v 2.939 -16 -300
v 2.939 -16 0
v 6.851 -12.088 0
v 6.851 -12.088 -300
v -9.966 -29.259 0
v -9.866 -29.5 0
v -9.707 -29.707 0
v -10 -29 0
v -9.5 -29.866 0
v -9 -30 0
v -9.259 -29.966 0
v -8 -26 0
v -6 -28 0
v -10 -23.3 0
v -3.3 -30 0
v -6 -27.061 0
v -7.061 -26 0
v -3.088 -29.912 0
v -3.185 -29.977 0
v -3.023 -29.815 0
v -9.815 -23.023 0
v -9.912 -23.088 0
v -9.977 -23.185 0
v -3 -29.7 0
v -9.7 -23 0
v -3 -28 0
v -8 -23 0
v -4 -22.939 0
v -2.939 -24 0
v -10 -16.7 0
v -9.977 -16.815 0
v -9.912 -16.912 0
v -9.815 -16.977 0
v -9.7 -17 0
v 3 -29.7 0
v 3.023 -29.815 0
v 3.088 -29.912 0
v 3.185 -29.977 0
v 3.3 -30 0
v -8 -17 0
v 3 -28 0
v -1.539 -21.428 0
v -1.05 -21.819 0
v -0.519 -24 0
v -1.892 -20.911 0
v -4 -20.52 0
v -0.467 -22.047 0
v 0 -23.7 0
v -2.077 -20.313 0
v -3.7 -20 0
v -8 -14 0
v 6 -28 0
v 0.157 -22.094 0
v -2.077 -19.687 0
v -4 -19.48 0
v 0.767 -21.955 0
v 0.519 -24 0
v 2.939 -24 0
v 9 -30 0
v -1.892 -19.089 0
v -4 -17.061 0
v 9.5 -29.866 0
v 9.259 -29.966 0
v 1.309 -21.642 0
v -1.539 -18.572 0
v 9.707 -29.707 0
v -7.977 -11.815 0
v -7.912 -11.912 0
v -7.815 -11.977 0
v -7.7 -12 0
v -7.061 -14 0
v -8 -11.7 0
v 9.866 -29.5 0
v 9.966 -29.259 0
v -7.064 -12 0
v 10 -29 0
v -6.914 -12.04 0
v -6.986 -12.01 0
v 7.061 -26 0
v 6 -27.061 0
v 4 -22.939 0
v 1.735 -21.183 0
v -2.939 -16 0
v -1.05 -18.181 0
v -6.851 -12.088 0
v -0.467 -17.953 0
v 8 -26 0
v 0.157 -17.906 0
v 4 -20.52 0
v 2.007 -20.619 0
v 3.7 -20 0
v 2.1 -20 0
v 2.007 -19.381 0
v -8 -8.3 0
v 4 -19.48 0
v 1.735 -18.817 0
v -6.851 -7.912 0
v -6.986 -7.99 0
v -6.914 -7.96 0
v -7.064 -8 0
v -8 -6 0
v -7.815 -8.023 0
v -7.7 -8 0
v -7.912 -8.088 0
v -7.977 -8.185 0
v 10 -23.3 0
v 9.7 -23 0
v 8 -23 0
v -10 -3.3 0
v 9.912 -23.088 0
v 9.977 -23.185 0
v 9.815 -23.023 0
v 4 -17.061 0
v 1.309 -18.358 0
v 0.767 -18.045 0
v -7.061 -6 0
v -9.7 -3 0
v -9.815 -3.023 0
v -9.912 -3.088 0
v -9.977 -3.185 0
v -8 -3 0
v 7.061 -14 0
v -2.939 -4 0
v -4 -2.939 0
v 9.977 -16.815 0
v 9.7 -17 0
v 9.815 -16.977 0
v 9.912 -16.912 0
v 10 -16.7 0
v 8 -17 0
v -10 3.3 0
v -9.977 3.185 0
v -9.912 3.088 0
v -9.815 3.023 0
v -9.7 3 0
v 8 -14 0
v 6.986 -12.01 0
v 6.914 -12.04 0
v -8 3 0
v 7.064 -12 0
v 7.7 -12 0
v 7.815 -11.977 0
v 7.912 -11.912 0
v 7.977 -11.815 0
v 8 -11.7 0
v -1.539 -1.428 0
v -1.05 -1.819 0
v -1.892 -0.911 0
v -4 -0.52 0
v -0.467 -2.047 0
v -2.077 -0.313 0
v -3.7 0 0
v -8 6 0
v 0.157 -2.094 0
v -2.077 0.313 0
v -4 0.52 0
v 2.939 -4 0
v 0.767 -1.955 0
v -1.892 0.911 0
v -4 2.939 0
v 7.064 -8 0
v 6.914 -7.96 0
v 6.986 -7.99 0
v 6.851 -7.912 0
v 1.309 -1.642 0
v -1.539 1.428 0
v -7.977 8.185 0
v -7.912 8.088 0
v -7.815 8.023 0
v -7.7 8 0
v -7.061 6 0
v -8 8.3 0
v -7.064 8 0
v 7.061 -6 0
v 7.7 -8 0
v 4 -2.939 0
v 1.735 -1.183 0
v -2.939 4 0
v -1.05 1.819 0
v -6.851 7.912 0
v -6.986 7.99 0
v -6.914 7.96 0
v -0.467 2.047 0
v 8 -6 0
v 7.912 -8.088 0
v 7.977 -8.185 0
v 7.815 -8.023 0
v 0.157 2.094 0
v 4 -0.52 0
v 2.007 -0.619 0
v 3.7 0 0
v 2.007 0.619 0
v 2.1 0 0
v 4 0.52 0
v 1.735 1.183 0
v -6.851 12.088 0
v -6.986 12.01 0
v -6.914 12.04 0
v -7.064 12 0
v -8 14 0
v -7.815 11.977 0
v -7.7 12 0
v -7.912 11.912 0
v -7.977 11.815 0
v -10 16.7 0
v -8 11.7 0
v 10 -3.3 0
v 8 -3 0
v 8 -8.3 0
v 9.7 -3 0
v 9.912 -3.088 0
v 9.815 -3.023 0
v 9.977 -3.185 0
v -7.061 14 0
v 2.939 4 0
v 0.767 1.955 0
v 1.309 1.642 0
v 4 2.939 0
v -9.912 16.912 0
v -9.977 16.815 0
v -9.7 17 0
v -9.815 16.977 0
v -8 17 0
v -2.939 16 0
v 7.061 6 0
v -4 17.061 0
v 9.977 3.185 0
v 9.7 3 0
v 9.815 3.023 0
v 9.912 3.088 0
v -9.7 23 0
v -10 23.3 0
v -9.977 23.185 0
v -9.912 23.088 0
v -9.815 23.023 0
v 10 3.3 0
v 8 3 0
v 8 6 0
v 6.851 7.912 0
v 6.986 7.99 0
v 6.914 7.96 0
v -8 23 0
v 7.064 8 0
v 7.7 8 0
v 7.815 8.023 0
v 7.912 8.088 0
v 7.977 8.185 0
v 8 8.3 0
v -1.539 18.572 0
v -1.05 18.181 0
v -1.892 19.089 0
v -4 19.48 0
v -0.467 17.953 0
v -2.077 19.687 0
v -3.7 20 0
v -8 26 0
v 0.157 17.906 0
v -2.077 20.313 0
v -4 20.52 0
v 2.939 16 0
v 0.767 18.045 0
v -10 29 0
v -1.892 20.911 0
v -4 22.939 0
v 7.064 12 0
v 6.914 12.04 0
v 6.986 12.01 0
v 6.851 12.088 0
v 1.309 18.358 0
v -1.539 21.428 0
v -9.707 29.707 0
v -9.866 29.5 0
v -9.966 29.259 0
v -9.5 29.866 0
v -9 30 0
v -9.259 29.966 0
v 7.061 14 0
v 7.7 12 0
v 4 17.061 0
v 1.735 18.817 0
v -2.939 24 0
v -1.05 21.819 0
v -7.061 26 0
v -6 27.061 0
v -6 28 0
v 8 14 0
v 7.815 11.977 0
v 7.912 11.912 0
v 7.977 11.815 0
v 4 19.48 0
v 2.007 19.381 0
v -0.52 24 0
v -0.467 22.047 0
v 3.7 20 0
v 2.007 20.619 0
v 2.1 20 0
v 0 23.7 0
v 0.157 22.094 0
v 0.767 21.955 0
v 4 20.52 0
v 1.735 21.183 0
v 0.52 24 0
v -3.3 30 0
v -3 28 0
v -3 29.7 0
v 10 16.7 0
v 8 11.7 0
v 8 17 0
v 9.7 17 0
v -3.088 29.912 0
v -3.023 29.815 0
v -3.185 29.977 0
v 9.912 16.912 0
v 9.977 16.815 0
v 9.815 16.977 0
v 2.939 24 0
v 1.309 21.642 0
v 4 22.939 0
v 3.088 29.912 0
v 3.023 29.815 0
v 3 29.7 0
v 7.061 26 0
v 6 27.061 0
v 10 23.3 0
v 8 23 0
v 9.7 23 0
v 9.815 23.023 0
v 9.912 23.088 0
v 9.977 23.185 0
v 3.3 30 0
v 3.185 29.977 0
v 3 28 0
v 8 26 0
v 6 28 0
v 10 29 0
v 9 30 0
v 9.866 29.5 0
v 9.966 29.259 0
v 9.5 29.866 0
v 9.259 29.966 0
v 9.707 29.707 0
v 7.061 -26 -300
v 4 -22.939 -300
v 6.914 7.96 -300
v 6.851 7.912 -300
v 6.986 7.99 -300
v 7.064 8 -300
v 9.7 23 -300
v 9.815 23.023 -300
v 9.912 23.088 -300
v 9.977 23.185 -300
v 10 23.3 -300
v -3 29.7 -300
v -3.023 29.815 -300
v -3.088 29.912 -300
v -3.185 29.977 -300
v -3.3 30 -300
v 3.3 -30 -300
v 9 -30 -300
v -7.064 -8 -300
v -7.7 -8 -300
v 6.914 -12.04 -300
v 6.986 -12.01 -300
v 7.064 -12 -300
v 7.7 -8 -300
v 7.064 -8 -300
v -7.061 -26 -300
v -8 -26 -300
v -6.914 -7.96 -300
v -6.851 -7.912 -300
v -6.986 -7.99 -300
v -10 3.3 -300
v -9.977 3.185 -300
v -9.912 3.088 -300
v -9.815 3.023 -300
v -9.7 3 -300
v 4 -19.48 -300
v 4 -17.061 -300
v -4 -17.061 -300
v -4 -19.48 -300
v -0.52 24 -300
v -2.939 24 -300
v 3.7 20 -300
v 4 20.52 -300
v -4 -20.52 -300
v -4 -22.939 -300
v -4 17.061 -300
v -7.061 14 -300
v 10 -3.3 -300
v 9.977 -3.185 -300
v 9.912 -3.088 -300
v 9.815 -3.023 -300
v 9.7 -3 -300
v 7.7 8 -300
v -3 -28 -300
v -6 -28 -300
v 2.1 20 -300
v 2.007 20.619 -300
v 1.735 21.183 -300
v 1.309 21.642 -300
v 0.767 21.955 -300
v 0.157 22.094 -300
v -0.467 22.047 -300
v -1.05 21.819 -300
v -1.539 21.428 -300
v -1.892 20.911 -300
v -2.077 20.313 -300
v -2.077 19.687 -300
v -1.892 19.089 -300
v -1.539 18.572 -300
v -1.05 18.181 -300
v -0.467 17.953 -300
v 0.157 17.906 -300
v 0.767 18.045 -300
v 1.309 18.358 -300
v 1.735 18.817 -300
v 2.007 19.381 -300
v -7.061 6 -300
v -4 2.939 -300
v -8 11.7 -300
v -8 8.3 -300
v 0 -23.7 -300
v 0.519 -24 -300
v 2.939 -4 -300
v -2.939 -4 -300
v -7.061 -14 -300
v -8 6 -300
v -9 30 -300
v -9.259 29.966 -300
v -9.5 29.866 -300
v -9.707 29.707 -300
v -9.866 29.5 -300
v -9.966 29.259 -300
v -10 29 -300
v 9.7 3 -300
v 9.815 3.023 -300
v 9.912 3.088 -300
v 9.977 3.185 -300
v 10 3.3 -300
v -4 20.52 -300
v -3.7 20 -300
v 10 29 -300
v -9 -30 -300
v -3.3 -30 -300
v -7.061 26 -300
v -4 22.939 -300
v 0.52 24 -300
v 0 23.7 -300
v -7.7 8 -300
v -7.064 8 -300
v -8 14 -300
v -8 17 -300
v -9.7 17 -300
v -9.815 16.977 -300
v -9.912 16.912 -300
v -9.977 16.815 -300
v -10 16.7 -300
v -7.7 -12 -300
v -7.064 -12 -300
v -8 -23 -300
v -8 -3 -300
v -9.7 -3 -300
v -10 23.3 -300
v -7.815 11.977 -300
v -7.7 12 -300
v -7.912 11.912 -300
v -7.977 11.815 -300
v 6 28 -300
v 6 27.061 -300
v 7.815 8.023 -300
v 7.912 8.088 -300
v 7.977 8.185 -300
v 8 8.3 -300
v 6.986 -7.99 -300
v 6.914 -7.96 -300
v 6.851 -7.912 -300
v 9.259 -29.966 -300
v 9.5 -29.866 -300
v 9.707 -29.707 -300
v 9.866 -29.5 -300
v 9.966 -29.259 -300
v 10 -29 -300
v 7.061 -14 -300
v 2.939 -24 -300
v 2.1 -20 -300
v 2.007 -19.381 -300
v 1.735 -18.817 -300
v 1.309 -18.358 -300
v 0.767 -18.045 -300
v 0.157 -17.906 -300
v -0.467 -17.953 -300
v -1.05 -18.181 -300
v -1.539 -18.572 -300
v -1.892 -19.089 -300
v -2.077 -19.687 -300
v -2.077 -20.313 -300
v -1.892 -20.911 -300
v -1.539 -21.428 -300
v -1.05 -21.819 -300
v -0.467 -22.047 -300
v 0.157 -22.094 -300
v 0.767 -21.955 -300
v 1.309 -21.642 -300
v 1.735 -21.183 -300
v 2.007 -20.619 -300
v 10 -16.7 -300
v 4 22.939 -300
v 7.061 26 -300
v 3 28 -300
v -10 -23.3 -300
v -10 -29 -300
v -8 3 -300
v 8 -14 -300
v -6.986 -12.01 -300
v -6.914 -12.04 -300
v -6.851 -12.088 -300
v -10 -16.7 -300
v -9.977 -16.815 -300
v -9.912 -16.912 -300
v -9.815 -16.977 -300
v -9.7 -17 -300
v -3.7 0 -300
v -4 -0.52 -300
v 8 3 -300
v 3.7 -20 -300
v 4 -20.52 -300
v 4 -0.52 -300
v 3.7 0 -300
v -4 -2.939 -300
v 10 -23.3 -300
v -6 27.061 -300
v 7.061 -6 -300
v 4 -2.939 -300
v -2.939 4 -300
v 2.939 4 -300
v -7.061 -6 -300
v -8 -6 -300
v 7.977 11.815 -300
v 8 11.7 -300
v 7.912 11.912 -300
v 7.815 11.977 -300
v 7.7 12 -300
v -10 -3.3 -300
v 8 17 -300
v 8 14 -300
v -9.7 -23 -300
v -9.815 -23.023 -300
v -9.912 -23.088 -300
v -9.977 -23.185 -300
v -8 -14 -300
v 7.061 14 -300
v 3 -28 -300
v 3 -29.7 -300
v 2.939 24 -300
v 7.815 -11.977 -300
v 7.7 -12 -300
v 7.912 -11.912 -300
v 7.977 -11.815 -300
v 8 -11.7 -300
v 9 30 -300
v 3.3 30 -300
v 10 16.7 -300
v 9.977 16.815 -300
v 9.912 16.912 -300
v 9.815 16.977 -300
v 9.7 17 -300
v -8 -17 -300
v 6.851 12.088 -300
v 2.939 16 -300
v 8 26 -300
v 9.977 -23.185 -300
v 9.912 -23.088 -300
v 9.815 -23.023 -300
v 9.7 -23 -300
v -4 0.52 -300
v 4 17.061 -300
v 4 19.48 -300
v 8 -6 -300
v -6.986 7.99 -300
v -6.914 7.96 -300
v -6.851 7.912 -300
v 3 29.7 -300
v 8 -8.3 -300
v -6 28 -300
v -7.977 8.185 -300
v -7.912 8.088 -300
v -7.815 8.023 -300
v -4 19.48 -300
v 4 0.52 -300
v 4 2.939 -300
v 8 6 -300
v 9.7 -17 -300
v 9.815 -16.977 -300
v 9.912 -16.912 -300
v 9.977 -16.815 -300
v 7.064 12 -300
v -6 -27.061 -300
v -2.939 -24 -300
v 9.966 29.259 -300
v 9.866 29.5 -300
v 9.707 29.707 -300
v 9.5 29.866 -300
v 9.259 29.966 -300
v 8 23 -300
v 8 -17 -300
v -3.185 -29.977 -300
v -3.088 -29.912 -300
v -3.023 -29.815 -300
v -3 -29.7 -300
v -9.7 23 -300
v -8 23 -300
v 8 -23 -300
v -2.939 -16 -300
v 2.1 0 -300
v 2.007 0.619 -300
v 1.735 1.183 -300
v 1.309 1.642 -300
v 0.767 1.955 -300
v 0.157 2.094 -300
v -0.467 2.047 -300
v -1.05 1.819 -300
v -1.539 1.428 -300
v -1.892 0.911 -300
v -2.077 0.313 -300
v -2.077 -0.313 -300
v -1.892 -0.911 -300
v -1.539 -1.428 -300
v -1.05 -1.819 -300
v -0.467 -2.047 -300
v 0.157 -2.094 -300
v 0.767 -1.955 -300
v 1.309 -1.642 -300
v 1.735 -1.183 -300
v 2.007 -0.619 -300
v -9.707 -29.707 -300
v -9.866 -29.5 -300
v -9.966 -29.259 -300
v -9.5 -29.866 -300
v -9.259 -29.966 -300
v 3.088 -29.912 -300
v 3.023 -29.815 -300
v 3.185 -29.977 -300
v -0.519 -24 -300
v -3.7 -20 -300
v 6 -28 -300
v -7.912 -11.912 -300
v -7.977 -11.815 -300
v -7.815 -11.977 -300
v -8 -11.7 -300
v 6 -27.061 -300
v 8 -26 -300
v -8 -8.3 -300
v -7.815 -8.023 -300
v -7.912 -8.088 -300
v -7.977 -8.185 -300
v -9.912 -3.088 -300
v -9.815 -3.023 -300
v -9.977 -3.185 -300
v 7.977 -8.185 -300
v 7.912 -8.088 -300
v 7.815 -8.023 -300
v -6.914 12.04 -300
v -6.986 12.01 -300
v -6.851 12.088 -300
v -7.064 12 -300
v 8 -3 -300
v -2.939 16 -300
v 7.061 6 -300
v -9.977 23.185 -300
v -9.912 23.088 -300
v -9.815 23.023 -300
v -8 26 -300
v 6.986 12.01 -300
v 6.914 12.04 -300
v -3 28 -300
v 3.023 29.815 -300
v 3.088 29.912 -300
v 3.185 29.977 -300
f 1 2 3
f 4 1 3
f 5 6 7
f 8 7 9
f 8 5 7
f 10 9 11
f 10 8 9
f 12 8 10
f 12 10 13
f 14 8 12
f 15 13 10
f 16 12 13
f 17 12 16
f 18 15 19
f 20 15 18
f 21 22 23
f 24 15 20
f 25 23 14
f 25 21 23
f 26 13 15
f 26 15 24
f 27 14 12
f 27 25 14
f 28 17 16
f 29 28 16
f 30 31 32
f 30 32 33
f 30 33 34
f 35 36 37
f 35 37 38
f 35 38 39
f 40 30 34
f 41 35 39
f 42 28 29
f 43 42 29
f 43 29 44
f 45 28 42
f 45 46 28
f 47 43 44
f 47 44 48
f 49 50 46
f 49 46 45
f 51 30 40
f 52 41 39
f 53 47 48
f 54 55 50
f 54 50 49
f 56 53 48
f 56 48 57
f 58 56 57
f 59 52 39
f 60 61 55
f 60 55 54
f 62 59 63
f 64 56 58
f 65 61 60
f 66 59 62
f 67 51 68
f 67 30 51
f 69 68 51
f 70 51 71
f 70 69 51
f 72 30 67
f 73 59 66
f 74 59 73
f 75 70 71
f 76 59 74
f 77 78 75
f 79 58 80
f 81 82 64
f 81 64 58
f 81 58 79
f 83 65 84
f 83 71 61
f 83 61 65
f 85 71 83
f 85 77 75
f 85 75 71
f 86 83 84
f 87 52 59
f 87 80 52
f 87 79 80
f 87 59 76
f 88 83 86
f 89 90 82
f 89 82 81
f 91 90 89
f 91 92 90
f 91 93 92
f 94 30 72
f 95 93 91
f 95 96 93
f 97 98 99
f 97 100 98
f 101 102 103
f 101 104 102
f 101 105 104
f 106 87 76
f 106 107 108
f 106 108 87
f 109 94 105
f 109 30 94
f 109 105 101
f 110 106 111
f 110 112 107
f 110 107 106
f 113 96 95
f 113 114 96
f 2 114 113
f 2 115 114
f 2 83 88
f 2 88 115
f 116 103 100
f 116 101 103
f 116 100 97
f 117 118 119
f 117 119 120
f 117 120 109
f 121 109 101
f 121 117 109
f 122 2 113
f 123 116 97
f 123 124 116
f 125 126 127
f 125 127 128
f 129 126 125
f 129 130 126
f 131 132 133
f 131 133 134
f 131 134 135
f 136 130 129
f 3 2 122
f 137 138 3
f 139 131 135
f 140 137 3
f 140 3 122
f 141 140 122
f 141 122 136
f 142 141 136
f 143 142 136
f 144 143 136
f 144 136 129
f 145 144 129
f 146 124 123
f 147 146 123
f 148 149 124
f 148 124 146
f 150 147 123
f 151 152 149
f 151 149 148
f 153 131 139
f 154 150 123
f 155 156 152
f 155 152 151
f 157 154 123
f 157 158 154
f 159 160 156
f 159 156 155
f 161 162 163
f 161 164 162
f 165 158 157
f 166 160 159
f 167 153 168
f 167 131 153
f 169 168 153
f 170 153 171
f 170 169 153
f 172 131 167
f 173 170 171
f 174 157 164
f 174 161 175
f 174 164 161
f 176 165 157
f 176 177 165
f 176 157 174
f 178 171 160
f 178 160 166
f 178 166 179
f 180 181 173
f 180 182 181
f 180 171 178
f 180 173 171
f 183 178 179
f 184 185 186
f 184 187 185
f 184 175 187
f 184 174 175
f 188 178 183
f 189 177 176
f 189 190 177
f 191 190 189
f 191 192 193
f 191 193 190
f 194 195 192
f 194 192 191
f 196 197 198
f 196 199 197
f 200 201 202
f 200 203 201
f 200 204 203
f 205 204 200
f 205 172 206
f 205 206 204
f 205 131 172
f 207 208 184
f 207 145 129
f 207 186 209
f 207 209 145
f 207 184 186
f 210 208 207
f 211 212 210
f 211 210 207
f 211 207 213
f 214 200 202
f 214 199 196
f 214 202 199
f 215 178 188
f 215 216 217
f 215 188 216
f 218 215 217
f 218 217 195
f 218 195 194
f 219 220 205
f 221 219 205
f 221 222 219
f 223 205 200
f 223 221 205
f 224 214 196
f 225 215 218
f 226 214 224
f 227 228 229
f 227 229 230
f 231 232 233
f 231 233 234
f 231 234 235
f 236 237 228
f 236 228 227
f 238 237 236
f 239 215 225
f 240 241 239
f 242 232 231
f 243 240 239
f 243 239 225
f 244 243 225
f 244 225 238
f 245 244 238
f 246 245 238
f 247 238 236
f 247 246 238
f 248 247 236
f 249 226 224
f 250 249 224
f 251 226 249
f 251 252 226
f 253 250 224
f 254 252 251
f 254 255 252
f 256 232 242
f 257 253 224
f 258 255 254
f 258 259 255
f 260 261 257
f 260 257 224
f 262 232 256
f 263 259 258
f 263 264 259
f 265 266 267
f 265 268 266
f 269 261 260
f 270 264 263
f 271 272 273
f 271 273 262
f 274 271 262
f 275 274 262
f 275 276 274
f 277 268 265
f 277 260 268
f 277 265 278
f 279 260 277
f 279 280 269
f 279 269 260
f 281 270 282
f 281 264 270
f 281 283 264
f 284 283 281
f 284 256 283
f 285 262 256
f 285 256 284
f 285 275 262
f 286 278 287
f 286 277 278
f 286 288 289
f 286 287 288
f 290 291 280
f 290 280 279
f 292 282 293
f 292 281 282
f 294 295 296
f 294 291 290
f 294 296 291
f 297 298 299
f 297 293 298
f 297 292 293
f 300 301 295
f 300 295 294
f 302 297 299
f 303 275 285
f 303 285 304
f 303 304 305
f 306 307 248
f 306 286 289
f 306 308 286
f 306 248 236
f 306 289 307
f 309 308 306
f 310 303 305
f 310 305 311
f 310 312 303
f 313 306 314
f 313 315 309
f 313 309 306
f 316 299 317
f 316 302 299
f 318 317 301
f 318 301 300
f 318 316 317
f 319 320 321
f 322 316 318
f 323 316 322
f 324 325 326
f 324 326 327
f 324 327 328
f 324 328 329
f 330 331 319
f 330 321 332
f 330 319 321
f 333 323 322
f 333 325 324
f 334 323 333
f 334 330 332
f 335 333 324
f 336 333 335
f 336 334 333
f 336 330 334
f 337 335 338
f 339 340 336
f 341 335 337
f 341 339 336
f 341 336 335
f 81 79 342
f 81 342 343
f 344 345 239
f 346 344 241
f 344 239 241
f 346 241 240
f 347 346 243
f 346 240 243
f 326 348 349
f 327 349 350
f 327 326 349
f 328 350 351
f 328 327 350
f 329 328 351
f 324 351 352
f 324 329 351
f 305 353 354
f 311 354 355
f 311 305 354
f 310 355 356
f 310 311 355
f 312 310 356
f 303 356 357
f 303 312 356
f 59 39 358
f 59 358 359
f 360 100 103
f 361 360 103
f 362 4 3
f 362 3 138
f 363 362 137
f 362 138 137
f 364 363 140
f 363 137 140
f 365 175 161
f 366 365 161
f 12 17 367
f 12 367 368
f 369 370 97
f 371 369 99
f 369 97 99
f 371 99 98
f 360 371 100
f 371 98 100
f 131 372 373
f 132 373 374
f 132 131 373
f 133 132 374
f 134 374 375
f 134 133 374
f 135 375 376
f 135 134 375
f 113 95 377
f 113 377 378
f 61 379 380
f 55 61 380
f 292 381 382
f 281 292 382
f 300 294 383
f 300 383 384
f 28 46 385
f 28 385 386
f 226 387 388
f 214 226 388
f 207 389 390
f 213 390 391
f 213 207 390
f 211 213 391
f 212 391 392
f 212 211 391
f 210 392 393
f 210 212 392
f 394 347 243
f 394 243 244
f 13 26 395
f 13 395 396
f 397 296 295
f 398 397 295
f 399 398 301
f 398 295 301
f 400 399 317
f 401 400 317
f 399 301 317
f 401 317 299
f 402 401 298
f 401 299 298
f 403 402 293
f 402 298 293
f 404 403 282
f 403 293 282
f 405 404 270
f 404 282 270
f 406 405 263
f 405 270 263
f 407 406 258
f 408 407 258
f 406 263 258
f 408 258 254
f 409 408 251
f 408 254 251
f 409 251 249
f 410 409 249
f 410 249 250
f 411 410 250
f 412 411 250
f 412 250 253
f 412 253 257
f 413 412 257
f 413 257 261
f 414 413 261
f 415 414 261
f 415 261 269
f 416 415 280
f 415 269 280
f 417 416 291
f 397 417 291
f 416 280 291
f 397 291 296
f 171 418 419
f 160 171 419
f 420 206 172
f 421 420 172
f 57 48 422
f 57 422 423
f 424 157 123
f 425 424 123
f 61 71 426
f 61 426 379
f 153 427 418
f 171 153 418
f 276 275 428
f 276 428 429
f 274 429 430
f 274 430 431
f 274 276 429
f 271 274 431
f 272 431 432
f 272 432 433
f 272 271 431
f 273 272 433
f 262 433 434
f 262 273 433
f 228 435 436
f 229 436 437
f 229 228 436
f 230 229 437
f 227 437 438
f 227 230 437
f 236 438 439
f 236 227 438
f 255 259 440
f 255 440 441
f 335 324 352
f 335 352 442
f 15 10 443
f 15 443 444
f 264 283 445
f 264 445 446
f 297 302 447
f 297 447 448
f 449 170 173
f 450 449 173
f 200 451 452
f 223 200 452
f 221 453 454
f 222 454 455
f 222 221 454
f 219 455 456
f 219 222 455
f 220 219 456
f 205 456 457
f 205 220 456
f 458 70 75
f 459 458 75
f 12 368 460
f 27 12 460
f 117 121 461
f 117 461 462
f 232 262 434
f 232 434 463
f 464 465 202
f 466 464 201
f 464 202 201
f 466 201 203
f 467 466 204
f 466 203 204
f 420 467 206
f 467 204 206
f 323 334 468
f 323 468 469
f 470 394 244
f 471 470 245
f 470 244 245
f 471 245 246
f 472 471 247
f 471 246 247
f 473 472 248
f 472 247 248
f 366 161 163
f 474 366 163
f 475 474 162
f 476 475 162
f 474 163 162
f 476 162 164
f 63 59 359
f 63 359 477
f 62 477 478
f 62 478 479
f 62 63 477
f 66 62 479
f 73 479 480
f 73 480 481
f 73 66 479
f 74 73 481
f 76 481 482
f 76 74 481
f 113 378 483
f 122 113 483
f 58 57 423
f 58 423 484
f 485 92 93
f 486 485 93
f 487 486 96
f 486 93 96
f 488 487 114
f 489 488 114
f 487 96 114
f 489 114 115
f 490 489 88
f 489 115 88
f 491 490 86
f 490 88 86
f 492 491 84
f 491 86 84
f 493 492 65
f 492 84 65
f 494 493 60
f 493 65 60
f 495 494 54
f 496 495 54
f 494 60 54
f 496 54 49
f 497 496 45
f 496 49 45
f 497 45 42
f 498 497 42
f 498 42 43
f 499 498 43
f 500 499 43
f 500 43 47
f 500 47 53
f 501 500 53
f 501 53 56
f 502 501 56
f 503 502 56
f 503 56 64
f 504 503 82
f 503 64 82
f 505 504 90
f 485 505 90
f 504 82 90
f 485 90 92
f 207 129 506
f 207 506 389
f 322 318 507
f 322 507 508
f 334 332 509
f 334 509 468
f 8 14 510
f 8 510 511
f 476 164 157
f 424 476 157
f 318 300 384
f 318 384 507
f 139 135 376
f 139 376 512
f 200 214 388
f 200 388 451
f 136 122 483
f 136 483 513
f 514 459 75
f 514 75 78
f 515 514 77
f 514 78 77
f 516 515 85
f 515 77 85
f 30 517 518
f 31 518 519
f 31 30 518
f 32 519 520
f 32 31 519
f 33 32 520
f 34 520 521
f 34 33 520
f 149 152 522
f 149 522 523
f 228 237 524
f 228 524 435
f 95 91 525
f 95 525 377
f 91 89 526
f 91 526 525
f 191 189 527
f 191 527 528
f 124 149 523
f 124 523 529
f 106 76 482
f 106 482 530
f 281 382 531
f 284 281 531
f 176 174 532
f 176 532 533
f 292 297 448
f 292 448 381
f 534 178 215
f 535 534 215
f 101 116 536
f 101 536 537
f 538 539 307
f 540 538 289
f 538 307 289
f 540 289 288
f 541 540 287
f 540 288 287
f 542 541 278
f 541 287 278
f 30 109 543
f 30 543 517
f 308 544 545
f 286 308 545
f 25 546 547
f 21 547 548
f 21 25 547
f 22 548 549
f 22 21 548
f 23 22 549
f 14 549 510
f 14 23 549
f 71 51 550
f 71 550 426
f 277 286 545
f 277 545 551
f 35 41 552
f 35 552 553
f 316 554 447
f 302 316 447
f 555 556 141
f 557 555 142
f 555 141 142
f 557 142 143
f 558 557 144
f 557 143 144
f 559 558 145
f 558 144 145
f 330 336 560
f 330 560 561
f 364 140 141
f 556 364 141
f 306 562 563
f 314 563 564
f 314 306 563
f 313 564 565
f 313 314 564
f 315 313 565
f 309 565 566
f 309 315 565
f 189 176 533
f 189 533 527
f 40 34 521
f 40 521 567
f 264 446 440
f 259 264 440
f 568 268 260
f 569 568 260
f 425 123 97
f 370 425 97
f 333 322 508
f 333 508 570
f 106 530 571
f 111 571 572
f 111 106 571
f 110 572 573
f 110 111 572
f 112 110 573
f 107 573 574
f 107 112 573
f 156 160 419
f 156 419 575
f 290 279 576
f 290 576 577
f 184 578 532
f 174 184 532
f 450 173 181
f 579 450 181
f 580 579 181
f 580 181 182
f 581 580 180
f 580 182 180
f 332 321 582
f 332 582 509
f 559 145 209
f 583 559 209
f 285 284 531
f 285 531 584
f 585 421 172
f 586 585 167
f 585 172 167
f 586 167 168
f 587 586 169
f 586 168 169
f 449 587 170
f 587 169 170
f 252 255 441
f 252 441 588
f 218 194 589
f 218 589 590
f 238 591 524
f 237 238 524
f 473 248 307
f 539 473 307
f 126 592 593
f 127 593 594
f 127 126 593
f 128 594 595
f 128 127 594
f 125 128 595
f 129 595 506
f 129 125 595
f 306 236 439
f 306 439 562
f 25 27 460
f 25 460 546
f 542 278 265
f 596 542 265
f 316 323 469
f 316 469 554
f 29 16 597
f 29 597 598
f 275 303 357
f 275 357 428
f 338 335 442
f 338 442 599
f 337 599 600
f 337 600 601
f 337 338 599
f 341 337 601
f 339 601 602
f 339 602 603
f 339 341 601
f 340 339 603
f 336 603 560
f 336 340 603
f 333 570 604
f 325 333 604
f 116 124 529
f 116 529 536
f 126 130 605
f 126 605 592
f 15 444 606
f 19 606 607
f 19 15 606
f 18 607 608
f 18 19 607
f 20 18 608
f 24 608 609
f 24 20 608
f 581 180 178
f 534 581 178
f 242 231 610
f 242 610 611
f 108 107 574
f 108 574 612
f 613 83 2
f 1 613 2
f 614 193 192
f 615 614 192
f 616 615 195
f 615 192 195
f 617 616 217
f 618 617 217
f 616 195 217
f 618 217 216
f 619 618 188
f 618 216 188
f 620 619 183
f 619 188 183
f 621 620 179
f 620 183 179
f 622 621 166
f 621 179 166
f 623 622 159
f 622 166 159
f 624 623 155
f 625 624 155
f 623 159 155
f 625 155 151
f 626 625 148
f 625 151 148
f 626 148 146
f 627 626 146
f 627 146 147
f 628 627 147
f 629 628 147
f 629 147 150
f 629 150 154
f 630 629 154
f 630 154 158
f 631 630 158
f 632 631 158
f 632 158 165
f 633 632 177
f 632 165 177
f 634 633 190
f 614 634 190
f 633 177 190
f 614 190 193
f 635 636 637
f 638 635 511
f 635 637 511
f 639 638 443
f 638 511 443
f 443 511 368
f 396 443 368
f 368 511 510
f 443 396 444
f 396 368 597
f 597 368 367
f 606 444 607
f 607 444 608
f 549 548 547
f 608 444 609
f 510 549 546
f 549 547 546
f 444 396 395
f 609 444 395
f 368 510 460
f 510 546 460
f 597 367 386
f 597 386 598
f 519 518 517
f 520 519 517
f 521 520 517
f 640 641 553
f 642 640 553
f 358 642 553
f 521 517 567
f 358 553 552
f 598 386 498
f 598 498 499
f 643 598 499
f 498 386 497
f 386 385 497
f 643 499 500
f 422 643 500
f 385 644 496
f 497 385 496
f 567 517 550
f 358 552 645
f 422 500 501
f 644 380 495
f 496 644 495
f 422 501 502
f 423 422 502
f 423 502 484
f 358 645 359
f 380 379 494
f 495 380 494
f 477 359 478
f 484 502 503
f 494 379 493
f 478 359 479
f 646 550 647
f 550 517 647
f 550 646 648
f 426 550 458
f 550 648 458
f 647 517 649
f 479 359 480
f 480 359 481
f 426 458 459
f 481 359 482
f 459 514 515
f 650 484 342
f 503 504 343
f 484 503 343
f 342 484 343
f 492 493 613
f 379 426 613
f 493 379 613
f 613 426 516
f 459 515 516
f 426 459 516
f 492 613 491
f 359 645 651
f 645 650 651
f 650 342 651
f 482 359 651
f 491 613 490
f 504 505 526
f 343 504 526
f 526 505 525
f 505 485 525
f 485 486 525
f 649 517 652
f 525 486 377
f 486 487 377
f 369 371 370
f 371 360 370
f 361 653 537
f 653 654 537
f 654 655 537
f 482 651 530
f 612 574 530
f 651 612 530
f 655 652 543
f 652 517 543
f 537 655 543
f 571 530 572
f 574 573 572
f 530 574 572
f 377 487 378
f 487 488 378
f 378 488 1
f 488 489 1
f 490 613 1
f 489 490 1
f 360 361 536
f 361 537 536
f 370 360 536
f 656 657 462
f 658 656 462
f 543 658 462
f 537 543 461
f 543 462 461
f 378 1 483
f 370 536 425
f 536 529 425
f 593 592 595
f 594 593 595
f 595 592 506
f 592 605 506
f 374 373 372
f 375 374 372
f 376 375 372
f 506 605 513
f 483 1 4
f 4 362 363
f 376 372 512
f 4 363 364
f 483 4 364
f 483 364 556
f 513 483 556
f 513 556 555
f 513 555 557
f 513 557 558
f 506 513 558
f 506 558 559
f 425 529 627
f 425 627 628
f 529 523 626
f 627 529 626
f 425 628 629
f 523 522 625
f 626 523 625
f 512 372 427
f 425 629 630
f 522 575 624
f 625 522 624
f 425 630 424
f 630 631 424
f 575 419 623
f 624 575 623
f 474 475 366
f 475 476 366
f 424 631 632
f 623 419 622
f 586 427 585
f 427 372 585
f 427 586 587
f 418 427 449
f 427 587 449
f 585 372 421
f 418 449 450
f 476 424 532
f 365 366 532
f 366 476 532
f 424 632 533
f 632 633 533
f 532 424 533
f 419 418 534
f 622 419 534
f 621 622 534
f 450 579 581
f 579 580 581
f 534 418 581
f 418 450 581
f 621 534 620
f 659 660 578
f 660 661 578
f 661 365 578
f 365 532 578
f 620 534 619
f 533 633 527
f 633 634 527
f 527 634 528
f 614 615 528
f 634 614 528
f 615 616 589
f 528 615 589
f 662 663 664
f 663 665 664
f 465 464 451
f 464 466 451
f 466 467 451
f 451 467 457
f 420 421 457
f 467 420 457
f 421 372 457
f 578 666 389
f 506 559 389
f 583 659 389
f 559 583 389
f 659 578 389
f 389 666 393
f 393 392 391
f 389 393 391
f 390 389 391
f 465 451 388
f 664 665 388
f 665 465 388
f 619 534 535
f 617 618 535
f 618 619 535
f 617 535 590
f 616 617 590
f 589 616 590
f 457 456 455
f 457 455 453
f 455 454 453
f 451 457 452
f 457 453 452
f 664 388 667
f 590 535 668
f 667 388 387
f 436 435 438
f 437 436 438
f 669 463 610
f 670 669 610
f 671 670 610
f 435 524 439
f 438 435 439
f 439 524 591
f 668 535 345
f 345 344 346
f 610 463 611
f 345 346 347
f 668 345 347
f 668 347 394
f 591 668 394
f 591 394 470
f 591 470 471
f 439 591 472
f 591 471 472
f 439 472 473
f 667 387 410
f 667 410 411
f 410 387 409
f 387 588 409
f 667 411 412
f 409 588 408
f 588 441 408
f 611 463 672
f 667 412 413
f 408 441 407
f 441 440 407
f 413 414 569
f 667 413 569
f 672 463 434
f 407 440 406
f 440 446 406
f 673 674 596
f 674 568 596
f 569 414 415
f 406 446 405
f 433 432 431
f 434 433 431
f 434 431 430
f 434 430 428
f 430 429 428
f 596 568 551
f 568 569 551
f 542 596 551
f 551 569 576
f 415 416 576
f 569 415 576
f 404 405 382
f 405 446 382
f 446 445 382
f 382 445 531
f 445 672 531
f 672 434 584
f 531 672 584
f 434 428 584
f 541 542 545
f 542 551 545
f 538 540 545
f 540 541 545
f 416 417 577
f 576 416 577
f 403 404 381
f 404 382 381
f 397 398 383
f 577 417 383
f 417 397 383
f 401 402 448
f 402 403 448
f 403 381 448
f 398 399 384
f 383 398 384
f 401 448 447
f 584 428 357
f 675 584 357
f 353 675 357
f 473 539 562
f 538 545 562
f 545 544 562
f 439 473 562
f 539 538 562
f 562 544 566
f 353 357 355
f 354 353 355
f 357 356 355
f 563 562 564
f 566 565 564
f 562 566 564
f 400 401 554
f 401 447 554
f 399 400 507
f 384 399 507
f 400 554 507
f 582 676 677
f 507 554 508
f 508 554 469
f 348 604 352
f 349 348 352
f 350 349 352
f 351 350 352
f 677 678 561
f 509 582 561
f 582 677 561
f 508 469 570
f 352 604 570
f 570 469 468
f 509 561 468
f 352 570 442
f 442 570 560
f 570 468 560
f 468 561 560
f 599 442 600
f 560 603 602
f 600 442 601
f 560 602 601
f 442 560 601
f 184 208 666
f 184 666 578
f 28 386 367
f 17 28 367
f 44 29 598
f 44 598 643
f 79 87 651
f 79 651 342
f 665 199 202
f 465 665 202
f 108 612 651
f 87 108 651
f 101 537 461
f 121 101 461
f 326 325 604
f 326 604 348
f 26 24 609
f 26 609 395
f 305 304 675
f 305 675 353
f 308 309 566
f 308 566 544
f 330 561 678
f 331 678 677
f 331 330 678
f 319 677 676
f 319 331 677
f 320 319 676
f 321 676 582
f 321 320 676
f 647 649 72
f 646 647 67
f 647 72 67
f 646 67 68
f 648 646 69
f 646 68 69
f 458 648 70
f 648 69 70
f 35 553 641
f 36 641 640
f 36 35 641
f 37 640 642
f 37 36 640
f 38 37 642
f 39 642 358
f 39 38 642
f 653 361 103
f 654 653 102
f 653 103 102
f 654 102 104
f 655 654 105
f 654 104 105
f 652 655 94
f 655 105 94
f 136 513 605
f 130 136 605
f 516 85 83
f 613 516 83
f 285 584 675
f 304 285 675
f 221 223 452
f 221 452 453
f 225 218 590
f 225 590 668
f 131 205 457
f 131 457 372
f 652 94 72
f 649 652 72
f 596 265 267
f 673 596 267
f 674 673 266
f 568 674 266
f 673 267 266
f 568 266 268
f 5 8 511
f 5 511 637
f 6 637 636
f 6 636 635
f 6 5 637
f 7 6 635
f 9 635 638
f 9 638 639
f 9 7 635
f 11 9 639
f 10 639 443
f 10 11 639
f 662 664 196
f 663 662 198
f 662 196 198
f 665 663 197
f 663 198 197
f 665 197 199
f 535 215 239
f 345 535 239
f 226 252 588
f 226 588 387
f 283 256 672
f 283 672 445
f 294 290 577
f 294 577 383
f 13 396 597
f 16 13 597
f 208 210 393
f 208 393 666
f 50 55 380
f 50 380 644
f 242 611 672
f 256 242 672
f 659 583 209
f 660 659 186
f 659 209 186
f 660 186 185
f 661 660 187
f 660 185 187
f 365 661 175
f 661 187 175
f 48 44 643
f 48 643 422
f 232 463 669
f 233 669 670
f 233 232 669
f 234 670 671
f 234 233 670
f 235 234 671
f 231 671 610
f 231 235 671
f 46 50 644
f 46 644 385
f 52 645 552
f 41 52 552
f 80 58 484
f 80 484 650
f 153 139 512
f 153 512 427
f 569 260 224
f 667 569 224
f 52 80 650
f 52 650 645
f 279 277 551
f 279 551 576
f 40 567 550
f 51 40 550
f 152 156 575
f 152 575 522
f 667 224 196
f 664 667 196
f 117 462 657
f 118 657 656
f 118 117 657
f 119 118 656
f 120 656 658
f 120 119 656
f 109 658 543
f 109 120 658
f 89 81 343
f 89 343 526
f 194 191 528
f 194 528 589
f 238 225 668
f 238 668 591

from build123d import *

# Parameters (mm, degrees)
SKETCH1_R           = 2.0999999
BOSS_EXTRUDE1_DEPTH = 300


with BuildPart() as part:
    # Sketch1 → Boss-Extrude1 (new body)
    with BuildSketch(Plane.XY):
        with BuildLine():
            Line((-10, 16.7), (-10, 3.3))
            ThreePointArc((-10, 3.3), (-9.912132034, 3.087867966), (-9.7, 3))
            Line((-9.7, 3), (-8, 3))
            Line((-8, 3), (-8, 6))
            Line((-8, 6), (-7.060650687, 6))
            Line((-7.060650687, 6), (-4, 2.939349))
            Line((-4, 2.939349), (-4, 0.519615242))
            Line((-4, 0.519615242), (-3.7, 0))
            Line((-3.7, 0), (-4, -0.519615242))
            Line((-4, -0.519615242), (-4, -2.9393502))
            Line((-4, -2.9393502), (-7.060649487, -6))
            Line((-7.060649487, -6), (-8, -6))
            Line((-8, -6), (-8, -3))
            Line((-8, -3), (-9.7, -3))
            ThreePointArc((-9.7, -3), (-9.912132034, -3.087867966), (-10, -3.3))
            Line((-10, -3.3), (-10, -16.7))
            ThreePointArc((-10, -16.7), (-9.912132034, -16.912132034), (-9.7, -17))
            Line((-9.7, -17), (-8, -17))
            Line((-8, -17), (-8, -14))
            Line((-8, -14), (-7.060672887, -14))
            Line((-7.060672887, -14), (-4, -17.0606732))
            Line((-4, -17.0606732), (-4, -19.480384758))
            Line((-4, -19.480384758), (-3.7, -20))
            Line((-3.7, -20), (-4, -20.519615242))
            Line((-4, -20.519615242), (-4, -22.93935665))
            Line((-4, -22.93935665), (-7.060643037, -26))
            Line((-7.060643037, -26), (-8, -26))
            Line((-8, -26), (-8, -23))
            Line((-8, -23), (-9.7, -23))
            ThreePointArc((-9.7, -23), (-9.912132034, -23.087867966), (-10, -23.3))
            Line((-10, -23.3), (-10, -29))
            ThreePointArc((-10, -29), (-9.707106781, -29.707106781), (-9, -30))
            Line((-9, -30), (-3.3, -30))
            ThreePointArc((-3.3, -30), (-3.087867966, -29.912132034), (-3, -29.7))
            Line((-3, -29.7), (-3, -28))
            Line((-3, -28), (-6, -28))
            Line((-6, -28), (-6, -27.060683408))
            Line((-6, -27.060683408), (-2.939316, -24))
            Line((-2.939316, -24), (-0.519095055, -24))
            Line((-0.519095055, -24), (1e-06, -23.7))
            Line((1e-06, -23.7), (0.518577868, -24))
            Line((0.518577868, -24), (2.939318, -24))
            Line((2.939318, -24), (6, -27.060682403))
            Line((6, -27.060682403), (6, -28))
            Line((6, -28), (3, -28))
            Line((3, -28), (3, -29.7))
            ThreePointArc((3, -29.7), (3.087867966, -29.912132034), (3.3, -30))
            Line((3.3, -30), (9, -30))
            ThreePointArc((9, -30), (9.707106781, -29.707106781), (10, -29))
            Line((10, -29), (10, -23.3))
            ThreePointArc((10, -23.3), (9.912132034, -23.087867966), (9.7, -23))
            Line((9.7, -23), (8, -23))
            Line((8, -23), (8, -26))
            Line((8, -26), (7.060637687, -26))
            Line((7.060637687, -26), (4, -22.93935641))
            Line((4, -22.93935641), (4, -20.519623992))
            Line((4, -20.519623992), (3.7, -20.00000875))
            Line((3.7, -20.00000875), (4, -19.480393508))
            Line((4, -19.480393508), (4, -17.06066109))
            Line((4, -17.06066109), (7.060655187, -14))
            Line((7.060655187, -14), (8, -14))
            Line((8, -14), (8, -17))
            Line((8, -17), (9.7, -17))
            ThreePointArc((9.7, -17), (9.912132034, -16.912132034), (10, -16.7))
            Line((10, -16.7), (10, -3.3))
            ThreePointArc((10, -3.3), (9.912132034, -3.087867966), (9.7, -3))
            Line((9.7, -3), (8, -3))
            Line((8, -3), (8, -6))
            Line((8, -6), (7.060651537, -6))
            Line((7.060651537, -6), (4, -2.93934815))
            Line((4, -2.93934815), (4, -0.519623992))
            Line((4, -0.519623992), (3.7, -8.75e-06))
            Line((3.7, -8.75e-06), (4, 0.519606492))
            Line((4, 0.519606492), (4, 2.9393426))
            Line((4, 2.9393426), (7.060657087, 6))
            Line((7.060657087, 6), (8, 6))
            Line((8, 6), (8, 3))
            Line((8, 3), (9.7, 3))
            ThreePointArc((9.7, 3), (9.912132034, 3.087867966), (10, 3.3))
            Line((10, 3.3), (10, 16.7))
            ThreePointArc((10, 16.7), (9.912132034, 16.912132034), (9.7, 17))
            Line((9.7, 17), (8, 17))
            Line((8, 17), (8, 14))
            Line((8, 14), (7.06065821, 14))
            Line((7.06065821, 14), (4, 17.060658523))
            Line((4, 17.060658523), (4, 19.480376008))
            Line((4, 19.480376008), (3.7, 19.99999125))
            Line((3.7, 19.99999125), (4, 20.519606492))
            Line((4, 20.519606492), (4, 22.939362173))
            Line((4, 22.939362173), (7.060637514, 26))
            Line((7.060637514, 26), (8, 26))
            Line((8, 26), (8, 23))
            Line((8, 23), (9.7, 23))
            ThreePointArc((9.7, 23), (9.912132034, 23.087867966), (10, 23.3))
            Line((10, 23.3), (10, 29))
            ThreePointArc((10, 29), (9.707106781, 29.707106781), (9, 30))
            Line((9, 30), (3.3, 30))
            ThreePointArc((3.3, 30), (3.087867966, 29.912132034), (3, 29.7))
            Line((3, 29.7), (3, 28))
            Line((3, 28), (6, 28))
            Line((6, 28), (6, 27.060684313))
            Line((6, 27.060684313), (2.939316, 24))
            Line((2.939316, 24), (0.519614242, 24))
            Line((0.519614242, 24), (-1e-06, 23.7))
            Line((-1e-06, 23.7), (-0.519616242, 24))
            Line((-0.519616242, 24), (-2.939318, 24))
            Line((-2.939318, 24), (-6, 27.060682313))
            Line((-6, 27.060682313), (-6, 28))
            Line((-6, 28), (-3, 28))
            Line((-3, 28), (-3, 29.7))
            ThreePointArc((-3, 29.7), (-3.087867966, 29.912132034), (-3.3, 30))
            Line((-3.3, 30), (-9, 30))
            ThreePointArc((-9, 30), (-9.707106781, 29.707106781), (-10, 29))
            Line((-10, 29), (-10, 23.3))
            ThreePointArc((-10, 23.3), (-9.912132034, 23.087867966), (-9.7, 23))
            Line((-9.7, 23), (-8, 23))
            Line((-8, 23), (-8, 26))
            Line((-8, 26), (-7.060644014, 26))
            Line((-7.060644014, 26), (-4, 22.939355673))
            Line((-4, 22.939355673), (-4, 20.519615242))
            Line((-4, 20.519615242), (-3.7, 20))
            Line((-3.7, 20), (-4, 19.480384758))
            Line((-4, 19.480384758), (-4, 17.060669373))
            Line((-4, 17.060669373), (-7.06066906, 14))
            Line((-7.06066906, 14), (-8, 14))
            Line((-8, 14), (-8, 17))
            Line((-8, 17), (-9.7, 17))
            ThreePointArc((-9.7, 17), (-9.912132034, 16.912132034), (-10, 16.7))
        make_face()
        with Locations((0, 20.000013123)):
            Circle(SKETCH1_R, mode=Mode.SUBTRACT)
        Circle(SKETCH1_R, mode=Mode.SUBTRACT)
        with Locations((0, -20.000013525)):
            Circle(SKETCH1_R, mode=Mode.SUBTRACT)
        with BuildLine():
            Line((-7.7, 8), (-7.063594325, 8))
            ThreePointArc((-7.063594325, 8), (-6.948789288, 7.977163857), (-6.85146228, 7.912132024))
            Line((-6.85146228, 7.912132024), (-2.939330656, 4))
            Line((-2.939330656, 4), (2.939337056, 4))
            Line((2.939337056, 4), (6.85146868, 7.912132024))
            ThreePointArc((6.85146868, 7.912132024), (6.948795688, 7.977163857), (7.063600725, 8))
            Line((7.063600725, 8), (7.7, 8))
            ThreePointArc((7.7, 8), (7.912132034, 8.087867966), (8, 8.3))
            Line((8, 8.3), (8, 11.7))
            ThreePointArc((8, 11.7), (7.912132034, 11.912132034), (7.7, 12))
            Line((7.7, 12), (7.063601848, 12))
            ThreePointArc((7.063601848, 12), (6.948796811, 12.022836143), (6.851469803, 12.087867976))
            Line((6.851469803, 12.087867976), (2.939338179, 16))
            Line((2.939338179, 16), (-2.939349029, 16))
            Line((-2.939349029, 16), (-6.851480653, 12.087867976))
            ThreePointArc((-6.851480653, 12.087867976), (-6.948807661, 12.022836143), (-7.063612698, 12))
            Line((-7.063612698, 12), (-7.7, 12))
            ThreePointArc((-7.7, 12), (-7.912132034, 11.912132034), (-8, 11.7))
            Line((-8, 11.7), (-8, 8.3))
            ThreePointArc((-8, 8.3), (-7.912132034, 8.087867966), (-7.7, 8))
        make_face(mode=Mode.SUBTRACT)
        with BuildLine():
            Line((-8, -8.3), (-8, -11.7))
            ThreePointArc((-8, -11.7), (-7.912132034, -11.912132034), (-7.7, -12))
            Line((-7.7, -12), (-7.063616525, -12))
            ThreePointArc((-7.063616525, -12), (-6.948811488, -12.022836143), (-6.85148448, -12.087867976))
            Line((-6.85148448, -12.087867976), (-2.939352856, -16))
            Line((-2.939352856, -16), (2.939340746, -16))
            Line((2.939340746, -16), (6.851465031, -12.08786817))
            ThreePointArc((6.851465031, -12.08786817), (6.948792107, -12.022836196), (7.06359727, -12))
            Line((7.06359727, -12), (7.7, -12))
            ThreePointArc((7.7, -12), (7.912132034, -11.912132034), (8, -11.7))
            Line((8, -11.7), (8, -8.3))
            ThreePointArc((8, -8.3), (7.912132034, -8.087867966), (7.7, -8))
            Line((7.7, -8), (7.063595175, -8))
            ThreePointArc((7.063595175, -8), (6.948790138, -7.977163857), (6.85146313, -7.912132024))
            Line((6.85146313, -7.912132024), (2.939331506, -4))
            Line((2.939331506, -4), (-2.939329456, -4))
            Line((-2.939329456, -4), (-6.85146108, -7.912132024))
            ThreePointArc((-6.85146108, -7.912132024), (-6.948788088, -7.977163857), (-7.063593125, -8))
            Line((-7.063593125, -8), (-7.7, -8))
            ThreePointArc((-7.7, -8), (-7.912132034, -8.087867966), (-8, -8.3))
        make_face(mode=Mode.SUBTRACT)
    extrude(amount=-BOSS_EXTRUDE1_DEPTH)


solid = part.part
